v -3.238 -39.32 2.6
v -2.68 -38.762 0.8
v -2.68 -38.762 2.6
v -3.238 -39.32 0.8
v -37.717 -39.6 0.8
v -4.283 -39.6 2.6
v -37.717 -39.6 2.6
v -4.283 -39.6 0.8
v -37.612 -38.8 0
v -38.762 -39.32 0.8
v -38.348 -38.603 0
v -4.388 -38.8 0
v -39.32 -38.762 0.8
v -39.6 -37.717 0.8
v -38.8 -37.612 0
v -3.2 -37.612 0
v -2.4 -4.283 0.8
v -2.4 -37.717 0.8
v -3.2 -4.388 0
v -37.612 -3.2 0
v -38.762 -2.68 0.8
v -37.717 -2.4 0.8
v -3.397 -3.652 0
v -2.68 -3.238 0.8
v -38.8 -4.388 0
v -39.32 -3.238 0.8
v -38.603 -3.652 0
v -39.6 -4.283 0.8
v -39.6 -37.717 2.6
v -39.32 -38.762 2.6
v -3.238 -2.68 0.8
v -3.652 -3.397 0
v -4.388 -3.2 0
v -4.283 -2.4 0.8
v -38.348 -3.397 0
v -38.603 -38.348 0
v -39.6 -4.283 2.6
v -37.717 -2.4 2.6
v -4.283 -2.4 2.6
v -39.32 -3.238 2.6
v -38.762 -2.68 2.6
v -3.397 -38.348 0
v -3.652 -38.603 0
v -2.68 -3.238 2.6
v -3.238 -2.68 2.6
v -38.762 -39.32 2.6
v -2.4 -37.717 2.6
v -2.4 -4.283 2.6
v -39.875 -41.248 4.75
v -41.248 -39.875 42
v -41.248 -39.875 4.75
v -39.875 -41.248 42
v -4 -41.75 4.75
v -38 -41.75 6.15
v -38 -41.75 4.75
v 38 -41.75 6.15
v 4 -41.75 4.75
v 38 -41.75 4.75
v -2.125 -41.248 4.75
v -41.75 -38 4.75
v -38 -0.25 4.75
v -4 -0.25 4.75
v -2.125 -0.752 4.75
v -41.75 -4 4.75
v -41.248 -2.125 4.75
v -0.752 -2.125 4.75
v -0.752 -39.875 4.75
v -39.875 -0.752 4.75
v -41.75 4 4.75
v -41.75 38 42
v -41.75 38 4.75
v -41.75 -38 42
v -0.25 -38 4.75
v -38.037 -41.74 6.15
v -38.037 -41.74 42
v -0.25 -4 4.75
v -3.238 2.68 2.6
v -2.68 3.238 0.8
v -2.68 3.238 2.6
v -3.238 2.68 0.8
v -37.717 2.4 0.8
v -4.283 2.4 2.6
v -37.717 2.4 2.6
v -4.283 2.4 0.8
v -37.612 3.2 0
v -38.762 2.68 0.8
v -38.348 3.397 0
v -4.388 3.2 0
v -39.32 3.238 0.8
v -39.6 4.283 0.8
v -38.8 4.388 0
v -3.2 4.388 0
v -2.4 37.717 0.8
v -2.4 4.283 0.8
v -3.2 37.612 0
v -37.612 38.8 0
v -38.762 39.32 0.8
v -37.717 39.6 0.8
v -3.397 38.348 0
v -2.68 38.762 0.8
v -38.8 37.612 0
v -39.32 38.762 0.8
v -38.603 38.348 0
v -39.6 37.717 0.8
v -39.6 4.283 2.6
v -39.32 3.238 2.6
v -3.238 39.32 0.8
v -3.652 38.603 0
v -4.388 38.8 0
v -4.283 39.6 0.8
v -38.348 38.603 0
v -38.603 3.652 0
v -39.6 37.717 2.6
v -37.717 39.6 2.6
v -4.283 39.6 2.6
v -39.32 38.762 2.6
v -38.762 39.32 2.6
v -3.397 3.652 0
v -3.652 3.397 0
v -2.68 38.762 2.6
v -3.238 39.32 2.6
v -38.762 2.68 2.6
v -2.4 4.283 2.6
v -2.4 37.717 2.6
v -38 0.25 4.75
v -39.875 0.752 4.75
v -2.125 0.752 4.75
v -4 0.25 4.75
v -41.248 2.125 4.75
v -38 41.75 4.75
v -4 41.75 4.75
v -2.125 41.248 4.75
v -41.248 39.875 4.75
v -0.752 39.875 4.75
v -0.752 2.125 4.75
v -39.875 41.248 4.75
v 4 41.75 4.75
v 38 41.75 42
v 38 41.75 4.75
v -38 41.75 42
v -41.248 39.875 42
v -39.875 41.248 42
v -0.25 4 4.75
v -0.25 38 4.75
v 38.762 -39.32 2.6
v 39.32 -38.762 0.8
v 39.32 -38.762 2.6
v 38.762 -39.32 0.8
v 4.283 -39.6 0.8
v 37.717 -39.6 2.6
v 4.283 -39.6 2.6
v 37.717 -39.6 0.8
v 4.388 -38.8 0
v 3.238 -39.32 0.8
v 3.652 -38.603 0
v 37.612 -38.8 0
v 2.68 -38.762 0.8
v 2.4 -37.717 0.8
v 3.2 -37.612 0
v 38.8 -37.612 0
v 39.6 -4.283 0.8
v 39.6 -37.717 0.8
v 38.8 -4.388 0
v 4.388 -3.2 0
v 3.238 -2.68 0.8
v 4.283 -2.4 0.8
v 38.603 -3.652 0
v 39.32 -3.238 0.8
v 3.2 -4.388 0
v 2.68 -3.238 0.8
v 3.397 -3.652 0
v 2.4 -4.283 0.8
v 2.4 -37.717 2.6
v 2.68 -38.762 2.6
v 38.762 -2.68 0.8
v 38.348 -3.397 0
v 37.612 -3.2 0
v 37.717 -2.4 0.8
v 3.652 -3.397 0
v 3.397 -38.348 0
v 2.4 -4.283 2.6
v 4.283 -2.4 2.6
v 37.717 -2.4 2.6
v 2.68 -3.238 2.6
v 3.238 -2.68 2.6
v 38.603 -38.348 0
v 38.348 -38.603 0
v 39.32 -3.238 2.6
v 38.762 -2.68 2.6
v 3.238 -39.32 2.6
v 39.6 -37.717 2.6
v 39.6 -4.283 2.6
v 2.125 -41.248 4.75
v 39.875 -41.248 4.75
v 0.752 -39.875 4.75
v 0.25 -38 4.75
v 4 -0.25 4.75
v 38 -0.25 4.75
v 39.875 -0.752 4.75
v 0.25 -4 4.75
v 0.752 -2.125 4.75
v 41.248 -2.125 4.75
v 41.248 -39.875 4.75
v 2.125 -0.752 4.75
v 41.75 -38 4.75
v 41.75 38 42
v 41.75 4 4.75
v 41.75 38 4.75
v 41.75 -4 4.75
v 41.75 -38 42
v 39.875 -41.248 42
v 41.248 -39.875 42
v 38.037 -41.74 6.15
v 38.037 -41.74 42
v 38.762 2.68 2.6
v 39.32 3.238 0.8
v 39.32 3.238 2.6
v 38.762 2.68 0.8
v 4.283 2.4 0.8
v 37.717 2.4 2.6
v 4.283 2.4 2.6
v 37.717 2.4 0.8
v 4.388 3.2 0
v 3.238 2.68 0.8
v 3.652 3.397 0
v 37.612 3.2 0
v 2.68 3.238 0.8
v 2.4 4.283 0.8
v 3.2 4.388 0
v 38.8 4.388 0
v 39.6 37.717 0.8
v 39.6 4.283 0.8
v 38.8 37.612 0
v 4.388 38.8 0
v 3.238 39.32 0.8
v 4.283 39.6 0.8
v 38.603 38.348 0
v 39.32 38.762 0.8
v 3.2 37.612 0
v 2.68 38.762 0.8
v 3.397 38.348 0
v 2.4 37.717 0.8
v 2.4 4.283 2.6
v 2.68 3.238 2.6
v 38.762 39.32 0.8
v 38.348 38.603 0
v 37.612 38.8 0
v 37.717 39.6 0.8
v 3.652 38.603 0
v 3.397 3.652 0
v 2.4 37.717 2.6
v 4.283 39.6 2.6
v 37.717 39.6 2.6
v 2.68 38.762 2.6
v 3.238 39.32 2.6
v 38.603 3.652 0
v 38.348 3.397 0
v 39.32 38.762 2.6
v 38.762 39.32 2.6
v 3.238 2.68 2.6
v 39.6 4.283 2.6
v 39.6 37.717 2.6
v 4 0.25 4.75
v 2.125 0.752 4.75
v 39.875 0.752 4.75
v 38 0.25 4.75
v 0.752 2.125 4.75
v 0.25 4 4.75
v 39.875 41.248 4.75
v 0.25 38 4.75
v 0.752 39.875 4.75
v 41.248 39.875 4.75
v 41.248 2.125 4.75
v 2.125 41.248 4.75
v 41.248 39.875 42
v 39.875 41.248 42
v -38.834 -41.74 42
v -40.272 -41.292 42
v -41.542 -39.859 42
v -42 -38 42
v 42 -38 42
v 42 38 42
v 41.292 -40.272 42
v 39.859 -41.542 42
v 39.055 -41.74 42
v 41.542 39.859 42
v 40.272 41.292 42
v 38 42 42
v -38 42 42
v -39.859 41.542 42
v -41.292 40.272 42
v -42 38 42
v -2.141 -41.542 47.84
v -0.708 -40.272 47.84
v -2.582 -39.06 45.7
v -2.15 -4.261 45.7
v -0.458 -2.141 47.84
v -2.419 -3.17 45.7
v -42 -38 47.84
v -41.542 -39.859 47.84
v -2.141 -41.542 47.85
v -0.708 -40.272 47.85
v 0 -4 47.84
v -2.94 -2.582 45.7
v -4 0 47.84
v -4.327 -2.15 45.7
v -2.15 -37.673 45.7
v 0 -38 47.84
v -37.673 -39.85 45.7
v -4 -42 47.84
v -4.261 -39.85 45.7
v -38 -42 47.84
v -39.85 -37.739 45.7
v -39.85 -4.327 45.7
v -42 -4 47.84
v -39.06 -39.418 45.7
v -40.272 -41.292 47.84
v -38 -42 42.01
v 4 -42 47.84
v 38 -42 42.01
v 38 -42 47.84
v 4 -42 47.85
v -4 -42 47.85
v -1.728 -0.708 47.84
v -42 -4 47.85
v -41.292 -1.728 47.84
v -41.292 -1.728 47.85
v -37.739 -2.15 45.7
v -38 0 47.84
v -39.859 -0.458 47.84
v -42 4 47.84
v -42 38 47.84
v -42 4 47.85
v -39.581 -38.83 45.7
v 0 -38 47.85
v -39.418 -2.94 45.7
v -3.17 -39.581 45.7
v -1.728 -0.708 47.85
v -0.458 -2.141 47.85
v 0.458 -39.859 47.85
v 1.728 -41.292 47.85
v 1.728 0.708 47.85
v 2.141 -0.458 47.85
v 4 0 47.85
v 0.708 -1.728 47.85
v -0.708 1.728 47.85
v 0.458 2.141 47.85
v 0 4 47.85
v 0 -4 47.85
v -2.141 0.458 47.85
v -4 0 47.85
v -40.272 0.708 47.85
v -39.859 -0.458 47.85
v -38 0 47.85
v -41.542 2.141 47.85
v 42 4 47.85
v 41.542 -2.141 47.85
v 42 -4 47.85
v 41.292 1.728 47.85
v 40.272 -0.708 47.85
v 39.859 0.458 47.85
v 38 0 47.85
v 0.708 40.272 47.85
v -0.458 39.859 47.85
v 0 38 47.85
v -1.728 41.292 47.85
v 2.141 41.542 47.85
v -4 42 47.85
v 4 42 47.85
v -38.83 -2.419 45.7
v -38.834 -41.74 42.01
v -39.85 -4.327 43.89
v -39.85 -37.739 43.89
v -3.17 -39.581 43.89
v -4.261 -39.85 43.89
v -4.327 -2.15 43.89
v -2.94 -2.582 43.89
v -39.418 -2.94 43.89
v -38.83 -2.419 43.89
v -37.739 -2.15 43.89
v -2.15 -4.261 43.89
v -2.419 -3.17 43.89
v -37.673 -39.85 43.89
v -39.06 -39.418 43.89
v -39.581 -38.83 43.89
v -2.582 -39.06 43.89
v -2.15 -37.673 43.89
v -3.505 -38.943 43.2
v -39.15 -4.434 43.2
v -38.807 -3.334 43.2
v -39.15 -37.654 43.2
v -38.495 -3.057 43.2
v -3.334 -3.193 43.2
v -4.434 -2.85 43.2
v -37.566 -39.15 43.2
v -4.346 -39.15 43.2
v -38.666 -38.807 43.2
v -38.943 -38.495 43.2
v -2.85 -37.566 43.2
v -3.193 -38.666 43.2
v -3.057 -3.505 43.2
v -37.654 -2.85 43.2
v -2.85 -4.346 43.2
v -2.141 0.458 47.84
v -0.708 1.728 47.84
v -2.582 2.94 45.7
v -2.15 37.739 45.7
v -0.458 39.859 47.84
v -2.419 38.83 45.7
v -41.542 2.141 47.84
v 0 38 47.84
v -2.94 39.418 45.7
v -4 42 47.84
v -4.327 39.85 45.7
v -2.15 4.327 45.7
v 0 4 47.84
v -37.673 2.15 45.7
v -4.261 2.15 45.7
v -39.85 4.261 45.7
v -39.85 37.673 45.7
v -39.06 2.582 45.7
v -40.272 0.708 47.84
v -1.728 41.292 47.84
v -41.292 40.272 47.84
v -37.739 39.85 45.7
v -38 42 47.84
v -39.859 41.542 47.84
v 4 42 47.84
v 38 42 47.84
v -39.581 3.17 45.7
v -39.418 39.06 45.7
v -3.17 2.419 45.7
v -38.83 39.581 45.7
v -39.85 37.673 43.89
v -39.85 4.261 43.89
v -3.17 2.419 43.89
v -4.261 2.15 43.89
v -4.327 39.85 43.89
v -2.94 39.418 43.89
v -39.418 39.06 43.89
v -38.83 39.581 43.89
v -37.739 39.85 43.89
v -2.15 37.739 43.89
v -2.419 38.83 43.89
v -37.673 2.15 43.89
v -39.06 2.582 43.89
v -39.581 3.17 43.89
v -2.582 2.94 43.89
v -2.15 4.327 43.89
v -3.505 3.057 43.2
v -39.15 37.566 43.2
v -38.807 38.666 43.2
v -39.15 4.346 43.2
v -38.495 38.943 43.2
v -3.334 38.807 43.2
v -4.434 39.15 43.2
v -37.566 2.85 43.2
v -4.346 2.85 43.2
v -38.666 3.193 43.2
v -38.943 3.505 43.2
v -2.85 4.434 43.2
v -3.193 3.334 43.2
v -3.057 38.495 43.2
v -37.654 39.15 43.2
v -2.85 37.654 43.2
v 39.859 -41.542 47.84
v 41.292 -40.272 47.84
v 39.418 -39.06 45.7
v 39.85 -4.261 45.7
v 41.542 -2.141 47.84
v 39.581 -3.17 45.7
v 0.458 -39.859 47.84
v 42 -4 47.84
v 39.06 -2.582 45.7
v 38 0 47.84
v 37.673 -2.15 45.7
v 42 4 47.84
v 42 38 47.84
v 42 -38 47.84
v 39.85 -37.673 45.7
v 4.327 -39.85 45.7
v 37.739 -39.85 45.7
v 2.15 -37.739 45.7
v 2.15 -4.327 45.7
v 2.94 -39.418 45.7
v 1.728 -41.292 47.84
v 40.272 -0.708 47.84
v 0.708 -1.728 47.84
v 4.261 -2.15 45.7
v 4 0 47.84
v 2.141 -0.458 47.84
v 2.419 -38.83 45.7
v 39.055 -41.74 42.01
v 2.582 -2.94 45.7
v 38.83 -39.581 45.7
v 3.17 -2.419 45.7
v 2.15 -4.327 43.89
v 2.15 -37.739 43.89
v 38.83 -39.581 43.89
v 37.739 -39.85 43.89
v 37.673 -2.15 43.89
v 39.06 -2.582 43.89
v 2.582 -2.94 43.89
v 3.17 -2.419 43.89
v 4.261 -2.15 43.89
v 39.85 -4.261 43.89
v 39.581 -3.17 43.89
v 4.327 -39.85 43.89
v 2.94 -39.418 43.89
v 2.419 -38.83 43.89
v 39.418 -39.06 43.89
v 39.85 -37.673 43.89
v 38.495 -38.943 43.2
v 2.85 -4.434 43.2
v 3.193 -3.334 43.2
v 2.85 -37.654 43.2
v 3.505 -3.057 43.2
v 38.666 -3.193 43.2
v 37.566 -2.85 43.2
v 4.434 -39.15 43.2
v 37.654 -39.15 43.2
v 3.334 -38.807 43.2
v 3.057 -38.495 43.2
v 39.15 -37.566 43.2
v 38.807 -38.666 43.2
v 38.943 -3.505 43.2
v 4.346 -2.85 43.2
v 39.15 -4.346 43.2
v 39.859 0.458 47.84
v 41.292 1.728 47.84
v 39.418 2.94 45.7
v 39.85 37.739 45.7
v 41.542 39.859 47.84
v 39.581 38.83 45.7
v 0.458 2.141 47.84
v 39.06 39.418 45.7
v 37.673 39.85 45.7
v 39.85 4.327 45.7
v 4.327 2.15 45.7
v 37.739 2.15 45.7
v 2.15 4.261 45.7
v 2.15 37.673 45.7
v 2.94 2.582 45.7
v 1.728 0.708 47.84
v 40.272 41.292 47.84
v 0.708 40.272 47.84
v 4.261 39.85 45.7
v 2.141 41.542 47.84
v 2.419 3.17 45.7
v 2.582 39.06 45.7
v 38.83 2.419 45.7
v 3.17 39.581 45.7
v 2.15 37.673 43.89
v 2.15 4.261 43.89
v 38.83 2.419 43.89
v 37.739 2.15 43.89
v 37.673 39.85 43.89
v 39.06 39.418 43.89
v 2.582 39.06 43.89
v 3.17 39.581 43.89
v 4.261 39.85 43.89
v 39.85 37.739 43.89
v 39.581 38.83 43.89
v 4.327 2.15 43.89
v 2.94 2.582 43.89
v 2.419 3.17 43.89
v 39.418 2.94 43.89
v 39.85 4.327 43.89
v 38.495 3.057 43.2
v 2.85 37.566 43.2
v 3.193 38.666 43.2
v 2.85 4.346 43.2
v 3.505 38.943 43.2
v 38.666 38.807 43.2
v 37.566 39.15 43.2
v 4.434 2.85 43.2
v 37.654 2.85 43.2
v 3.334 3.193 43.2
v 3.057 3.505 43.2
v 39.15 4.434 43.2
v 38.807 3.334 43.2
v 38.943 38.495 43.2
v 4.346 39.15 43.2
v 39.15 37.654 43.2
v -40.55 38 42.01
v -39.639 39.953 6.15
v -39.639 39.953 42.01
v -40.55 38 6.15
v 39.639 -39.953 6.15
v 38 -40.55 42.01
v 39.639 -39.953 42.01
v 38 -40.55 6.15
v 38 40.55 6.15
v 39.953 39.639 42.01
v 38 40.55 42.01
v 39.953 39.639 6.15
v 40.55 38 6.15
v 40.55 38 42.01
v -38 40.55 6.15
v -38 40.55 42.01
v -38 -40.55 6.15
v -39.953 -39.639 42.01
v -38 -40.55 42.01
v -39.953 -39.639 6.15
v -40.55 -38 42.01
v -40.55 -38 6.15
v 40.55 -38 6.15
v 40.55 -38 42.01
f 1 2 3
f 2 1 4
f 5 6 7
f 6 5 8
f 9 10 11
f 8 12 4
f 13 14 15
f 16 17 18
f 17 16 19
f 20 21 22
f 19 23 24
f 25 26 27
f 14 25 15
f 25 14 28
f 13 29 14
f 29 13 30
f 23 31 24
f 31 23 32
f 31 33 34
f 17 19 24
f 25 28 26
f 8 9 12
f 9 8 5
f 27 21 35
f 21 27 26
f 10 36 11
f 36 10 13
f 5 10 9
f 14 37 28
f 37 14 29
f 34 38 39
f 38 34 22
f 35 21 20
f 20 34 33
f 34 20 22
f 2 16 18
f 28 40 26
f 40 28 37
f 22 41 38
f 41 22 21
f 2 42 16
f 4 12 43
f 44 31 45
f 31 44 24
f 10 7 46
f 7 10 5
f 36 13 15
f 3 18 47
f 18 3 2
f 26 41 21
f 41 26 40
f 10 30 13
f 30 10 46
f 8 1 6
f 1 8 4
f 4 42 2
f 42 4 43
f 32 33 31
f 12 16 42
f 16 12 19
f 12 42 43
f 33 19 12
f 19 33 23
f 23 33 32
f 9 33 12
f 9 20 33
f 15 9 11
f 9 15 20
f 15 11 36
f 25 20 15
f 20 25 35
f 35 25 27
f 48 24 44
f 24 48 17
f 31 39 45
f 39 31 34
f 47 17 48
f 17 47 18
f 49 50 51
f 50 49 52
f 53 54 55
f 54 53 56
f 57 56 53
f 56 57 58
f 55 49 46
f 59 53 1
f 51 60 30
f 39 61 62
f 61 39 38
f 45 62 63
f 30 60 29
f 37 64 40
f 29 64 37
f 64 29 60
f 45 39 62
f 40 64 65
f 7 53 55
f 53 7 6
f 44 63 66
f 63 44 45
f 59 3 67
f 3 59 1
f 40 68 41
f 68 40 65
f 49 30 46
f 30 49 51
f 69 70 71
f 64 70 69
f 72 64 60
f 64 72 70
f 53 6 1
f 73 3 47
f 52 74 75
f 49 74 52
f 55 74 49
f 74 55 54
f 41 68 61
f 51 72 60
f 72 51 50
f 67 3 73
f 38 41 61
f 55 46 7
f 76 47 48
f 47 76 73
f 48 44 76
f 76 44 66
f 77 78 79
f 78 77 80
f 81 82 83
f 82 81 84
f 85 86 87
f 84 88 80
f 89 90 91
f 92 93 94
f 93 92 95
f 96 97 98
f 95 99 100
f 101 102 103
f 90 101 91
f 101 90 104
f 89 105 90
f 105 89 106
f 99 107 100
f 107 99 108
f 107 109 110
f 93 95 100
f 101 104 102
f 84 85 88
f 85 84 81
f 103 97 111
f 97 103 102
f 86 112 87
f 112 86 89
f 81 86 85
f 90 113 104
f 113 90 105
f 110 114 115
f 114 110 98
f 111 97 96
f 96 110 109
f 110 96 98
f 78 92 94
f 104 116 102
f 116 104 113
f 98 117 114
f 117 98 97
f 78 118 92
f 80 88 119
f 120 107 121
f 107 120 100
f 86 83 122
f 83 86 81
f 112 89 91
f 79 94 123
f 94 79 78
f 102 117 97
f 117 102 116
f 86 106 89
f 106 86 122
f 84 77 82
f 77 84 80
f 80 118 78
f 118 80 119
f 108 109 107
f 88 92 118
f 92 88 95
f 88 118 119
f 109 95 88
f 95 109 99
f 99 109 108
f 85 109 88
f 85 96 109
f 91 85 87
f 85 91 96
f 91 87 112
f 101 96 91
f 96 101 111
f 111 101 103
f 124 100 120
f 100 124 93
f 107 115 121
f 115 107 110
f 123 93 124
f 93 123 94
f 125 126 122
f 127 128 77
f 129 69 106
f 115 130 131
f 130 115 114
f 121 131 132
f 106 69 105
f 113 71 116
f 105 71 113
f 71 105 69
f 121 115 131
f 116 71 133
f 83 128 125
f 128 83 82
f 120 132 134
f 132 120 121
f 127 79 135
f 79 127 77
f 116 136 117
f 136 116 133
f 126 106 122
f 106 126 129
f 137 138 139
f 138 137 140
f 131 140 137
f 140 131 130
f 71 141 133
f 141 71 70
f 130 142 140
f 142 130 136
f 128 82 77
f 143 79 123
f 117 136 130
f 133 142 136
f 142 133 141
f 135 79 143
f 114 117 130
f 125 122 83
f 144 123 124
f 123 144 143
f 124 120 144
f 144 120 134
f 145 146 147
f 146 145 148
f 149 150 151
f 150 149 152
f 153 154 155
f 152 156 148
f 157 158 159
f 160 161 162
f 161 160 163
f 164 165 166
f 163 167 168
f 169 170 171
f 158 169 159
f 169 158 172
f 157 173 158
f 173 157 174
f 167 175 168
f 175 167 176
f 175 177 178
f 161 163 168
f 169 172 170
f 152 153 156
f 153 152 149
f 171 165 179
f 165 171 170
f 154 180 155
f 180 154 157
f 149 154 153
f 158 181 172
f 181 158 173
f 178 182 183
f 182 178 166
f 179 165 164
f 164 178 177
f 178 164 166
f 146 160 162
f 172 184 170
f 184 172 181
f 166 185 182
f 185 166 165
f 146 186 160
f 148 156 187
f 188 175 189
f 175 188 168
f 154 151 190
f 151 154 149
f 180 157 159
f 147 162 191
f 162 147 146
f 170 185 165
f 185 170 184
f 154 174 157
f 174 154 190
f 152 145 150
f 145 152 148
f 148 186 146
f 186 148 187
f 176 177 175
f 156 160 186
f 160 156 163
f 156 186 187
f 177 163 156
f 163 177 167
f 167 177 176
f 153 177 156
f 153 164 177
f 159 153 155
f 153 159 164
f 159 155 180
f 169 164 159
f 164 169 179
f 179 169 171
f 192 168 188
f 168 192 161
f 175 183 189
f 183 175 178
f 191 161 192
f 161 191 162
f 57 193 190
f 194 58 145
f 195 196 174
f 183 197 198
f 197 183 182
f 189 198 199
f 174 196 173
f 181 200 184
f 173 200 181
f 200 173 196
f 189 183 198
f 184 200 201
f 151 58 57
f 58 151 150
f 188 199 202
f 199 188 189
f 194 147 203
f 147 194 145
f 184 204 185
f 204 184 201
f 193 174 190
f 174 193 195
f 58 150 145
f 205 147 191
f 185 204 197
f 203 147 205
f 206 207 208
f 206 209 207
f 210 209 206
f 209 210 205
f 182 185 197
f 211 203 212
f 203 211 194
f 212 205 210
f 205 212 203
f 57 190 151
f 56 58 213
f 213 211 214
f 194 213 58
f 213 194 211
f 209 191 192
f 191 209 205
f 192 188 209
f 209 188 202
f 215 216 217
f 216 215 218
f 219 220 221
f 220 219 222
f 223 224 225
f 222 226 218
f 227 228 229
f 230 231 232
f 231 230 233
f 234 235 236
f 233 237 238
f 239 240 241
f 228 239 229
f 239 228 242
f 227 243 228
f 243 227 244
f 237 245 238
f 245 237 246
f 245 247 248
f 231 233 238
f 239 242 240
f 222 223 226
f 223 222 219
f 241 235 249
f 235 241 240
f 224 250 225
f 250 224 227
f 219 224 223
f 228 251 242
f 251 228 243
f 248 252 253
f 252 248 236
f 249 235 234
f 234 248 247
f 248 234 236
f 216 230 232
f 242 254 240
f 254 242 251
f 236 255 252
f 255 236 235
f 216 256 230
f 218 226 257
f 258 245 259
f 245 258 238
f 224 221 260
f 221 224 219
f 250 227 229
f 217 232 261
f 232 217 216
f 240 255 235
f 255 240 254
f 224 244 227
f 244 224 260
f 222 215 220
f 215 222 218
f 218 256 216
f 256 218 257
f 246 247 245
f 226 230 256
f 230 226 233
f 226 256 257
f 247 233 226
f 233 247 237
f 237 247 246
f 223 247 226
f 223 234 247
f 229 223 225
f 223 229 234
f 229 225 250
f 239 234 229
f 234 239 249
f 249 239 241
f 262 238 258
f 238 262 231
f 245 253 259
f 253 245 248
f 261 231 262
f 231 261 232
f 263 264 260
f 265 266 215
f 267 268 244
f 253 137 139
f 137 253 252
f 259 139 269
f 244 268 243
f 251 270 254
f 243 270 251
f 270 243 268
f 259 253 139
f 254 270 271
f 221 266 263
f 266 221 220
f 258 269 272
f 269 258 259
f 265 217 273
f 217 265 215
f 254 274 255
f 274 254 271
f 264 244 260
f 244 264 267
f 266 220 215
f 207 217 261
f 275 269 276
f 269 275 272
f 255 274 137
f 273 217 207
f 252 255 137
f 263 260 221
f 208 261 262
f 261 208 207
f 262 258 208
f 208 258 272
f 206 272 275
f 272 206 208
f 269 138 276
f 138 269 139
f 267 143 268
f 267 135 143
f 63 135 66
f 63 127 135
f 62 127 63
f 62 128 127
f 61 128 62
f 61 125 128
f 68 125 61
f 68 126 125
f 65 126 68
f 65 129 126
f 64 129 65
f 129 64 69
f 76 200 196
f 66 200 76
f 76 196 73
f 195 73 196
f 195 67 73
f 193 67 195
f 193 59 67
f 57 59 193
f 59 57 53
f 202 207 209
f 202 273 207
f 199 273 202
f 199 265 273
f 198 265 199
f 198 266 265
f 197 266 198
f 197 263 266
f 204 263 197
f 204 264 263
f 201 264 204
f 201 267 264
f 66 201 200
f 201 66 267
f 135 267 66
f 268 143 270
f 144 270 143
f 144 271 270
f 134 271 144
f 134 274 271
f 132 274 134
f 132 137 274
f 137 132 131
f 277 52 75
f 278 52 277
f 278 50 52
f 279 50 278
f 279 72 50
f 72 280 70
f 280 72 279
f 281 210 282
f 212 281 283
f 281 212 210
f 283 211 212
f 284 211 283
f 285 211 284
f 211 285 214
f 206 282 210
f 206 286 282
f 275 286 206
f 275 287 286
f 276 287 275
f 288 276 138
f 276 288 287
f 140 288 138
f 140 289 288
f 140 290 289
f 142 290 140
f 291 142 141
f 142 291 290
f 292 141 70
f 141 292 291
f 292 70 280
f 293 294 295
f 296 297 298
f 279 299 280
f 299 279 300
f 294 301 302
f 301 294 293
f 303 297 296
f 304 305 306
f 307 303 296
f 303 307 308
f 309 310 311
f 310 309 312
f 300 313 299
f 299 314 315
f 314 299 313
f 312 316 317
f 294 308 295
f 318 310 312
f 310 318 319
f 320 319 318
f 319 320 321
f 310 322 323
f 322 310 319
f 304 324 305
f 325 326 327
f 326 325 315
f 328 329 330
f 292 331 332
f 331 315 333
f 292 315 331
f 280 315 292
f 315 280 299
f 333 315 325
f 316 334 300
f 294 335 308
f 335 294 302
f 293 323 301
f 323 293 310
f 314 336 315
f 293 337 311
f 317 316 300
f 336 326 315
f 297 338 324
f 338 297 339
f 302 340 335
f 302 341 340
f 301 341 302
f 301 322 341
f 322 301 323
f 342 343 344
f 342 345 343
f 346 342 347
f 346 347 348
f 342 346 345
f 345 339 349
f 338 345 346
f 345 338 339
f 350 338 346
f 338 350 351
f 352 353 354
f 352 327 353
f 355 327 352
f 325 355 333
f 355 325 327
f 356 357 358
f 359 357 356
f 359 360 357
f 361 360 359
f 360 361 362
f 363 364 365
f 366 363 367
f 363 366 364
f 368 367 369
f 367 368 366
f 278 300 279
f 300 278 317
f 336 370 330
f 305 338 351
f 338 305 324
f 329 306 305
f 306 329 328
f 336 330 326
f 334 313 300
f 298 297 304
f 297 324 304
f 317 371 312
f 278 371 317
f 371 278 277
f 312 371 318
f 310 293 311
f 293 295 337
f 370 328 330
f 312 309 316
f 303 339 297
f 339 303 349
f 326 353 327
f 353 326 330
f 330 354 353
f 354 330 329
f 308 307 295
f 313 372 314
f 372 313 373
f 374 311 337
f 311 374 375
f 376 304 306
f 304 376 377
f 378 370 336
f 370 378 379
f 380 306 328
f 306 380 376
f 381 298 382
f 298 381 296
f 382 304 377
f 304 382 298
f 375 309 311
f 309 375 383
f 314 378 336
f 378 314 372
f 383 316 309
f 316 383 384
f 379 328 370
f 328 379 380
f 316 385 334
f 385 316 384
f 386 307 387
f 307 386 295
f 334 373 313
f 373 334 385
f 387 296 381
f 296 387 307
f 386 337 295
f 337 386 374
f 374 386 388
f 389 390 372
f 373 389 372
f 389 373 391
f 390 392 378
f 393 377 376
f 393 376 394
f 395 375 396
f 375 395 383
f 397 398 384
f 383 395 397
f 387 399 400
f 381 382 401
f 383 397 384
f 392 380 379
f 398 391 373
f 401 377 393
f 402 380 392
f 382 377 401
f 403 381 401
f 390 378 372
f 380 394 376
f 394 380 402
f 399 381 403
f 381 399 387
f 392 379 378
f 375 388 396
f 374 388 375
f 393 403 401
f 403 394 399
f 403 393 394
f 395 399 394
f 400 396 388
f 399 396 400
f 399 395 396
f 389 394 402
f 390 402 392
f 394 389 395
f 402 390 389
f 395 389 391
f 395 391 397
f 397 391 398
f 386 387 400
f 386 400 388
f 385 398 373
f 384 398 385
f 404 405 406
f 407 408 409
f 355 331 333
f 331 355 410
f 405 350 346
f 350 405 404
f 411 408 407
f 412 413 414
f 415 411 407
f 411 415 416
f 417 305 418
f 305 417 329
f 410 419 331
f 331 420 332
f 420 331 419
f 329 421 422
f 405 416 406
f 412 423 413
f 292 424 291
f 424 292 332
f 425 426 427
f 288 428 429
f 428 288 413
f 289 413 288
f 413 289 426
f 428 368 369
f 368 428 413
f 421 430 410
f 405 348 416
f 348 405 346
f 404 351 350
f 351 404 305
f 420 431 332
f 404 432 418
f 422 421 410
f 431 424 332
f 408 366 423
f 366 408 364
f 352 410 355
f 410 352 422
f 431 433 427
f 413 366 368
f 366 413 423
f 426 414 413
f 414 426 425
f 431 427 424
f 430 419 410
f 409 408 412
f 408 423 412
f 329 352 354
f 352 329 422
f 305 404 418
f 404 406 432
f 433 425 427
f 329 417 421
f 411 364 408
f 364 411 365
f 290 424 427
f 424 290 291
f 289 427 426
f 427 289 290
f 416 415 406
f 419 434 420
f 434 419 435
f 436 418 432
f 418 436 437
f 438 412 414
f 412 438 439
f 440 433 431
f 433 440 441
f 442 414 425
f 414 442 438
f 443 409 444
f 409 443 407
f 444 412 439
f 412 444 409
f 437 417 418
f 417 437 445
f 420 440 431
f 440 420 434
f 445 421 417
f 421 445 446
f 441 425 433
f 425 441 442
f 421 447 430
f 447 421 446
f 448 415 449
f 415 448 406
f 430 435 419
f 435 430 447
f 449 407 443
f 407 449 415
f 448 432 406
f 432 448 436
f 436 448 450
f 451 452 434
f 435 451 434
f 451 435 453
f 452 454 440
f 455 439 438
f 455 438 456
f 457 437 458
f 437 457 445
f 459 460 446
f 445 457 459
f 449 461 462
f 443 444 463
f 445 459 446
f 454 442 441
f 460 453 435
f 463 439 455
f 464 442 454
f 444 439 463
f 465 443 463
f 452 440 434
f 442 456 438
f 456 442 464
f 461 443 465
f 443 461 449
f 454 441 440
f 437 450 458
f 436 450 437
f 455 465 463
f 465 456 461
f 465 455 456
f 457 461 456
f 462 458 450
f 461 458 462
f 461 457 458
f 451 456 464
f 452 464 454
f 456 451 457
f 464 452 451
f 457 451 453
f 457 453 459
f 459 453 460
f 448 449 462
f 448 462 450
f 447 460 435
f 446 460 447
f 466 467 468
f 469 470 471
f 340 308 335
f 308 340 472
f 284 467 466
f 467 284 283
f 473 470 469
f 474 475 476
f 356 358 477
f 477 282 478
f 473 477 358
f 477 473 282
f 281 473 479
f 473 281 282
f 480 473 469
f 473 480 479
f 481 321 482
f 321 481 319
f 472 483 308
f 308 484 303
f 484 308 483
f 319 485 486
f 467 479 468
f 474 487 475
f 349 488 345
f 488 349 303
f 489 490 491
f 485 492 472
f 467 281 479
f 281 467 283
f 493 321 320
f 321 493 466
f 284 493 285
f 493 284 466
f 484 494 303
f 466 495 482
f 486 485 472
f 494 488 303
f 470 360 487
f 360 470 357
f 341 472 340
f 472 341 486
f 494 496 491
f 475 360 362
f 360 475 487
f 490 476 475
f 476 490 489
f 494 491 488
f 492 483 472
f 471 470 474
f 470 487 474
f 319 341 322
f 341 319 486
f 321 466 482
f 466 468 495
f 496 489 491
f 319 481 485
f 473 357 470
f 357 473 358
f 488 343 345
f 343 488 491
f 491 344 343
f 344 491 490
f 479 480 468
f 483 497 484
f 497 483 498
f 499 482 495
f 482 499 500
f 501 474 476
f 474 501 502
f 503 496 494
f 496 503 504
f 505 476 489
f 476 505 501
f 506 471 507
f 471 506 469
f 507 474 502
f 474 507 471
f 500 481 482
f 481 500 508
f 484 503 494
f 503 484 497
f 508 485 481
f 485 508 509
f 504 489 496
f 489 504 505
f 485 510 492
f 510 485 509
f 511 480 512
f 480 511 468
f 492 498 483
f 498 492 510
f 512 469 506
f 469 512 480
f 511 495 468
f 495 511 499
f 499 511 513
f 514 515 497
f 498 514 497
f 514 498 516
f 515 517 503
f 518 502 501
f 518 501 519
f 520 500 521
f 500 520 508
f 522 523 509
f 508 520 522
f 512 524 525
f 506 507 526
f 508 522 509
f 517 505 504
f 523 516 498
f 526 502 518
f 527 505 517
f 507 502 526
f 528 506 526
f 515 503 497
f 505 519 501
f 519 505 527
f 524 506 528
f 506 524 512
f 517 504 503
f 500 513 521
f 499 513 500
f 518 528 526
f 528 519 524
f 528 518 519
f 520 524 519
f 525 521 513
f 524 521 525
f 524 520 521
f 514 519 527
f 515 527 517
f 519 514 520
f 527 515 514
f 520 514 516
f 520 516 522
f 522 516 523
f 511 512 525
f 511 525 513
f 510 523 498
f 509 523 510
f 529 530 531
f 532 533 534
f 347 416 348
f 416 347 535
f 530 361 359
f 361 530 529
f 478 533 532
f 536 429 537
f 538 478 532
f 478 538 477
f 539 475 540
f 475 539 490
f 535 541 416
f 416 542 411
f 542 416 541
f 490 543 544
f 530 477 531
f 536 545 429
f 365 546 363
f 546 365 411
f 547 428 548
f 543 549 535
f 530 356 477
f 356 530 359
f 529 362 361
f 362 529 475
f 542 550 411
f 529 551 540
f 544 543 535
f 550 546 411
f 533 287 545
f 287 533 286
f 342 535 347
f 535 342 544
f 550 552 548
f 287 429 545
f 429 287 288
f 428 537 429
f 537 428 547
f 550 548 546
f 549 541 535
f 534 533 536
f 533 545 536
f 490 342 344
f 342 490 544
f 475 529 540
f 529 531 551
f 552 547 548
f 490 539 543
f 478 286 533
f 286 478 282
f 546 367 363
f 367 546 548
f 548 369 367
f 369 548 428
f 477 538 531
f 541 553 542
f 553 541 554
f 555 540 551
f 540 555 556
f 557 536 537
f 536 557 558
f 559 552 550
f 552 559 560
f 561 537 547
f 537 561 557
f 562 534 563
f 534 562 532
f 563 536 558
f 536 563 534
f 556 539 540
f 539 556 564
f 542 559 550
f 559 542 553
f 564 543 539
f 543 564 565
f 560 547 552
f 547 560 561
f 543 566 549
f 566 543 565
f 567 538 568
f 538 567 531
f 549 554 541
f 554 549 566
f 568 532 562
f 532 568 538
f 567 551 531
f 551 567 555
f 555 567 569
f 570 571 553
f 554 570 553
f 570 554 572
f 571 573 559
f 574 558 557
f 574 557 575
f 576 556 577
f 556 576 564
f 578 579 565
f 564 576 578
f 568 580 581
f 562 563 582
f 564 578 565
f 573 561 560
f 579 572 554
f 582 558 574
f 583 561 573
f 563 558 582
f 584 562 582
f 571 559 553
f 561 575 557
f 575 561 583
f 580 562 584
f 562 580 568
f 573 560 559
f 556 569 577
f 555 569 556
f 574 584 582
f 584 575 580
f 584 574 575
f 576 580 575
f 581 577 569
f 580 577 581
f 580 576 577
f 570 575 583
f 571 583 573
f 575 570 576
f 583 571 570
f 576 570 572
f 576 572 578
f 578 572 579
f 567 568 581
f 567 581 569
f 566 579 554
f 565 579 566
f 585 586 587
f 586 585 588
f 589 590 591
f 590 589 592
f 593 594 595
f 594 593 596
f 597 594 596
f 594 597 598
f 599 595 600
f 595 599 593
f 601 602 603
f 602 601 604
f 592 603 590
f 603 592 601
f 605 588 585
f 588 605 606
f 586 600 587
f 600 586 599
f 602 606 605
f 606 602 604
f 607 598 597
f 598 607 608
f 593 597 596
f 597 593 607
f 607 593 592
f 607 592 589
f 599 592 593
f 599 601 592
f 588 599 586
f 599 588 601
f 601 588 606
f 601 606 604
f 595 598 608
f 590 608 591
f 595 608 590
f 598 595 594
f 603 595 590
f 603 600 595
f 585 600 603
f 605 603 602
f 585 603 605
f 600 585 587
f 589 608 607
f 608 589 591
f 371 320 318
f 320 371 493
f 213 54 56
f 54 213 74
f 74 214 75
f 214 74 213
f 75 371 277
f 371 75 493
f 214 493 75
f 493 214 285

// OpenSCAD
// file: ../lib/gridfinity.scad
// gridfinity.scad — shared Gridfinity baseplate + bin library (per spec).
//
// 42 mm pitch, 41.5 mm bins, baseplate socket 0.7/1.8/2.15 = 4.65 mm, 4 mm
// fillet; bin foot 0.8/1.8/2.15 = 4.75 mm, 3.75 mm corner radius. Verified the
// bin foot seats in the baseplate socket with ~0.25–0.5 mm clearance.
//
//   baseplate(nx, ny)                      — tiled receiving baseplate
//   bin_blank(nx, ny, h)                   — solid bin body (feet + block, no cavity)
//   bin(nx, ny, h, wall, floor)            — open Gridfinity bin
//   divided_bin(nx, ny, h, cols, rows, …)  — bin with internal compartments
//   lid(nx, ny, …)                         — friction lid for a bin of the same footprint
//   stack_base(nx, ny, h, …)               — baseplate-topped base; a bin socket-stacks on it

GF = 42; GF_FILLET = 4;
_C_TOP = 2.15; _C_MID = 1.8; _C_BOT = 0.7;
_BP_LIP = _C_TOP + _C_MID + _C_BOT; _BP_FLOOR = 1.2; BP_H = _BP_LIP + _BP_FLOOR;  // 5.85
BIN_SZ = 41.5; BIN_R = 3.75; BIN_BASE_H = 4.75;

// ---- baseplate ----
module _bp_cell(i = 0) { offset(r = -i) offset(r = GF_FILLET) offset(r = -GF_FILLET) square(GF, center = true); }
module _bp_socket() {
    e = 0.01;
    hull() { translate([0,0,BP_H-e]) linear_extrude(e) _bp_cell(0); translate([0,0,BP_H-_C_TOP]) linear_extrude(e) _bp_cell(_C_TOP); }
    translate([0,0,BP_H-_C_TOP-_C_MID]) linear_extrude(_C_MID) _bp_cell(_C_TOP);
    hull() { translate([0,0,BP_H-_C_TOP-_C_MID-e]) linear_extrude(e) _bp_cell(_C_TOP); translate([0,0,BP_H-_BP_LIP]) linear_extrude(e) _bp_cell(_C_TOP+_C_BOT); }
}
module baseplate(nx, ny) {
    w = nx*GF; d = ny*GF;
    difference() {
        translate([0,0,BP_H/2]) linear_extrude(BP_H, center=true) offset(GF_FILLET) offset(-GF_FILLET) square([w,d], center=true);
        for (ix=[0:nx-1], iy=[0:ny-1]) translate([(ix-(nx-1)/2)*GF, (iy-(ny-1)/2)*GF, 0]) _bp_socket();
    }
}

// ---- bin ----
module _bin_cell(i = 0) { offset(r = -i) offset(r = BIN_R) offset(r = -BIN_R) square(BIN_SZ, center = true); }
module _bin_foot() {
    e = 0.01;
    hull() { linear_extrude(e) _bin_cell(2.95); translate([0,0,0.8]) linear_extrude(e) _bin_cell(2.15); }    // bottom chamfer
    translate([0,0,0.8]) linear_extrude(1.8) _bin_cell(2.15);                                                 // vertical
    hull() { translate([0,0,2.6]) linear_extrude(e) _bin_cell(2.15); translate([0,0,BIN_BASE_H]) linear_extrude(e) _bin_cell(0); } // top chamfer
}
// Solid bin body: Gridfinity feet + the block above them, with no cavity cut.
// Cup-style bins (lib/vessel.scad) subtract their own bores from this instead of
// re-deriving the foot + shell union.
module bin_blank(nx, ny, h) {
    W = nx*GF - 0.5; D = ny*GF - 0.5;
    union() {
        for (ix=[0:nx-1], iy=[0:ny-1]) translate([(ix-(nx-1)/2)*GF, (iy-(ny-1)/2)*GF, 0]) _bin_foot();
        translate([0,0,BIN_BASE_H]) linear_extrude(h-BIN_BASE_H) offset(BIN_R) offset(-BIN_R) square([W,D], center=true);
    }
}

module _bin_shell(nx, ny, h, wall, floor) {
    W = nx*GF - 0.5; D = ny*GF - 0.5;
    difference() {
        bin_blank(nx, ny, h);
        translate([0,0,BIN_BASE_H+floor]) linear_extrude(h) offset(BIN_R-wall) offset(-(BIN_R-wall)) square([W-2*wall, D-2*wall], center=true);
    }
}
module bin(nx, ny, h, wall = 1.2, floor = 1.4) { _bin_shell(nx, ny, h, wall, floor); }

// ---- stacking base ----
// A bin whose TOP is a Gridfinity baseplate, so a standard bin socket-stacks on
// it (two-tier towers: instrument on top, cords/jig/adapters in the base). The
// base is open at the FRONT (−Y) by default so the lower item is reachable while
// the top tier stays socketed — same idea as drybox-splitter-stand's open cubby.
// The whole tower foots on the bench baseplate via this base's own foot.
//
//   h = interior height of the lower compartment (floor to the baseplate cap).
module stack_base(nx, ny, h, wall = 1.2, floor = 1.4, open_front = true) {
    W = nx*GF - 0.5; D = ny*GF - 0.5;
    z0 = BIN_BASE_H + floor;
    iw = W - 2*wall; id = D - 2*wall;
    difference() {
        union() {
            bin_blank(nx, ny, h);                    // solid foot + block to h
            translate([0,0,h]) baseplate(nx, ny);    // baseplate cap (sockets up)
        }
        // lower cavity, floor up to the cap underside
        translate([0,0,z0]) linear_extrude(h - z0 + 0.01)
            offset(BIN_R-wall) offset(-(BIN_R-wall)) square([iw, id], center=true);
        // open front: cut the −Y wall so you reach in under the cap
        if (open_front)
            translate([-iw/2, -D, z0]) cube([iw, D/2 + 0.01, h - z0 + 0.01]);
    }
}

module divided_bin(nx, ny, h, cols = 1, rows = 1, wall = 1.2, floor = 1.4, div = 1.2) {
    W = nx*GF - 0.5; D = ny*GF - 0.5;
    union() {
        bin(nx, ny, h, wall, floor);
        // internal divider walls (from the floor up to the rim)
        iw = W - 2*wall; id = D - 2*wall; z0 = BIN_BASE_H + floor;
        for (c = [1 : cols-1]) translate([-iw/2 + c*iw/cols - div/2, -id/2, z0]) cube([div, id, h - z0]);
        for (r = [1 : rows-1]) translate([-iw/2, -id/2 + r*id/rows - div/2, z0]) cube([iw, div, h - z0]);
    }
}

// ---- lid ----
// Friction lid for a bin of the same footprint: a flat plate with a skirt that
// drops into the bin's cavity. Emitted PRINT-READY — plate on the bed, skirt
// standing up — so it needs no supports. Flip it in your head to picture it
// fitted: the plate then caps the rim and the lid adds `t` to the stack height.
//
// Why lids exist here: full-extension drawer slides let small parts hop between
// compartments on a hard close, and brass inserts aren't magnetic — you can't
// sweep them back. `wall` must match the bin's wall so the skirt lands in the
// cavity; `clearance` is per-side slop between skirt and cavity.
module lid(nx, ny, t = 1.6, skirt = 4, wall = 1.2, clearance = 0.35, lid_wall = 1.6) {
    W = nx*GF - 0.5; D = ny*GF - 0.5;
    iw = W - 2*wall - 2*clearance; id = D - 2*wall - 2*clearance;   // skirt outer
    ir = BIN_R - wall;                                              // cavity corner radius
    union() {
        linear_extrude(t) offset(BIN_R) offset(-BIN_R) square([W, D], center=true);
        translate([0,0,t]) linear_extrude(skirt) difference() {
            offset(ir) offset(-ir) square([iw, id], center=true);
            offset(ir-lid_wall) offset(-(ir-lid_wall)) square([iw-2*lid_wall, id-2*lid_wall], center=true);
        }
    }
}
// file: instrument_towers_common.scad
// instrument_towers_common — two-tier socket-stacked towers: instrument in the
// TOP bin (grab-and-go), its bits (cords/adapters) in the open-front stack_base
// below. Lift the top off (or reach the front) to get at the base. Each tower is
// independent and foots on the bench baseplate via its own base.
include <../lib/gridfinity.scad>

// ---- DSLogic Plus tower (2×2) ----
DSLOGIC_W = 74.01;   // measured width — fits a 2×2 (81 interior)
DSLOGIC_D = 70;      // ⚠ estimate (glared read) — confirm
DSLOGIC_TOP_H = 20;  // ⚠ PLACEHOLDER — analyzer height sets the top-bin depth
CORD_BASE_H   = 42;  // ⚠ PLACEHOLDER — base depth for the flying-lead harness + clips
// main file
// dslogic_base — open-front stack_base for the DSLogic harness + clips (print foot-down).
include <instrument_towers_common.scad>
stack_base(2, 2, CORD_BASE_H);
